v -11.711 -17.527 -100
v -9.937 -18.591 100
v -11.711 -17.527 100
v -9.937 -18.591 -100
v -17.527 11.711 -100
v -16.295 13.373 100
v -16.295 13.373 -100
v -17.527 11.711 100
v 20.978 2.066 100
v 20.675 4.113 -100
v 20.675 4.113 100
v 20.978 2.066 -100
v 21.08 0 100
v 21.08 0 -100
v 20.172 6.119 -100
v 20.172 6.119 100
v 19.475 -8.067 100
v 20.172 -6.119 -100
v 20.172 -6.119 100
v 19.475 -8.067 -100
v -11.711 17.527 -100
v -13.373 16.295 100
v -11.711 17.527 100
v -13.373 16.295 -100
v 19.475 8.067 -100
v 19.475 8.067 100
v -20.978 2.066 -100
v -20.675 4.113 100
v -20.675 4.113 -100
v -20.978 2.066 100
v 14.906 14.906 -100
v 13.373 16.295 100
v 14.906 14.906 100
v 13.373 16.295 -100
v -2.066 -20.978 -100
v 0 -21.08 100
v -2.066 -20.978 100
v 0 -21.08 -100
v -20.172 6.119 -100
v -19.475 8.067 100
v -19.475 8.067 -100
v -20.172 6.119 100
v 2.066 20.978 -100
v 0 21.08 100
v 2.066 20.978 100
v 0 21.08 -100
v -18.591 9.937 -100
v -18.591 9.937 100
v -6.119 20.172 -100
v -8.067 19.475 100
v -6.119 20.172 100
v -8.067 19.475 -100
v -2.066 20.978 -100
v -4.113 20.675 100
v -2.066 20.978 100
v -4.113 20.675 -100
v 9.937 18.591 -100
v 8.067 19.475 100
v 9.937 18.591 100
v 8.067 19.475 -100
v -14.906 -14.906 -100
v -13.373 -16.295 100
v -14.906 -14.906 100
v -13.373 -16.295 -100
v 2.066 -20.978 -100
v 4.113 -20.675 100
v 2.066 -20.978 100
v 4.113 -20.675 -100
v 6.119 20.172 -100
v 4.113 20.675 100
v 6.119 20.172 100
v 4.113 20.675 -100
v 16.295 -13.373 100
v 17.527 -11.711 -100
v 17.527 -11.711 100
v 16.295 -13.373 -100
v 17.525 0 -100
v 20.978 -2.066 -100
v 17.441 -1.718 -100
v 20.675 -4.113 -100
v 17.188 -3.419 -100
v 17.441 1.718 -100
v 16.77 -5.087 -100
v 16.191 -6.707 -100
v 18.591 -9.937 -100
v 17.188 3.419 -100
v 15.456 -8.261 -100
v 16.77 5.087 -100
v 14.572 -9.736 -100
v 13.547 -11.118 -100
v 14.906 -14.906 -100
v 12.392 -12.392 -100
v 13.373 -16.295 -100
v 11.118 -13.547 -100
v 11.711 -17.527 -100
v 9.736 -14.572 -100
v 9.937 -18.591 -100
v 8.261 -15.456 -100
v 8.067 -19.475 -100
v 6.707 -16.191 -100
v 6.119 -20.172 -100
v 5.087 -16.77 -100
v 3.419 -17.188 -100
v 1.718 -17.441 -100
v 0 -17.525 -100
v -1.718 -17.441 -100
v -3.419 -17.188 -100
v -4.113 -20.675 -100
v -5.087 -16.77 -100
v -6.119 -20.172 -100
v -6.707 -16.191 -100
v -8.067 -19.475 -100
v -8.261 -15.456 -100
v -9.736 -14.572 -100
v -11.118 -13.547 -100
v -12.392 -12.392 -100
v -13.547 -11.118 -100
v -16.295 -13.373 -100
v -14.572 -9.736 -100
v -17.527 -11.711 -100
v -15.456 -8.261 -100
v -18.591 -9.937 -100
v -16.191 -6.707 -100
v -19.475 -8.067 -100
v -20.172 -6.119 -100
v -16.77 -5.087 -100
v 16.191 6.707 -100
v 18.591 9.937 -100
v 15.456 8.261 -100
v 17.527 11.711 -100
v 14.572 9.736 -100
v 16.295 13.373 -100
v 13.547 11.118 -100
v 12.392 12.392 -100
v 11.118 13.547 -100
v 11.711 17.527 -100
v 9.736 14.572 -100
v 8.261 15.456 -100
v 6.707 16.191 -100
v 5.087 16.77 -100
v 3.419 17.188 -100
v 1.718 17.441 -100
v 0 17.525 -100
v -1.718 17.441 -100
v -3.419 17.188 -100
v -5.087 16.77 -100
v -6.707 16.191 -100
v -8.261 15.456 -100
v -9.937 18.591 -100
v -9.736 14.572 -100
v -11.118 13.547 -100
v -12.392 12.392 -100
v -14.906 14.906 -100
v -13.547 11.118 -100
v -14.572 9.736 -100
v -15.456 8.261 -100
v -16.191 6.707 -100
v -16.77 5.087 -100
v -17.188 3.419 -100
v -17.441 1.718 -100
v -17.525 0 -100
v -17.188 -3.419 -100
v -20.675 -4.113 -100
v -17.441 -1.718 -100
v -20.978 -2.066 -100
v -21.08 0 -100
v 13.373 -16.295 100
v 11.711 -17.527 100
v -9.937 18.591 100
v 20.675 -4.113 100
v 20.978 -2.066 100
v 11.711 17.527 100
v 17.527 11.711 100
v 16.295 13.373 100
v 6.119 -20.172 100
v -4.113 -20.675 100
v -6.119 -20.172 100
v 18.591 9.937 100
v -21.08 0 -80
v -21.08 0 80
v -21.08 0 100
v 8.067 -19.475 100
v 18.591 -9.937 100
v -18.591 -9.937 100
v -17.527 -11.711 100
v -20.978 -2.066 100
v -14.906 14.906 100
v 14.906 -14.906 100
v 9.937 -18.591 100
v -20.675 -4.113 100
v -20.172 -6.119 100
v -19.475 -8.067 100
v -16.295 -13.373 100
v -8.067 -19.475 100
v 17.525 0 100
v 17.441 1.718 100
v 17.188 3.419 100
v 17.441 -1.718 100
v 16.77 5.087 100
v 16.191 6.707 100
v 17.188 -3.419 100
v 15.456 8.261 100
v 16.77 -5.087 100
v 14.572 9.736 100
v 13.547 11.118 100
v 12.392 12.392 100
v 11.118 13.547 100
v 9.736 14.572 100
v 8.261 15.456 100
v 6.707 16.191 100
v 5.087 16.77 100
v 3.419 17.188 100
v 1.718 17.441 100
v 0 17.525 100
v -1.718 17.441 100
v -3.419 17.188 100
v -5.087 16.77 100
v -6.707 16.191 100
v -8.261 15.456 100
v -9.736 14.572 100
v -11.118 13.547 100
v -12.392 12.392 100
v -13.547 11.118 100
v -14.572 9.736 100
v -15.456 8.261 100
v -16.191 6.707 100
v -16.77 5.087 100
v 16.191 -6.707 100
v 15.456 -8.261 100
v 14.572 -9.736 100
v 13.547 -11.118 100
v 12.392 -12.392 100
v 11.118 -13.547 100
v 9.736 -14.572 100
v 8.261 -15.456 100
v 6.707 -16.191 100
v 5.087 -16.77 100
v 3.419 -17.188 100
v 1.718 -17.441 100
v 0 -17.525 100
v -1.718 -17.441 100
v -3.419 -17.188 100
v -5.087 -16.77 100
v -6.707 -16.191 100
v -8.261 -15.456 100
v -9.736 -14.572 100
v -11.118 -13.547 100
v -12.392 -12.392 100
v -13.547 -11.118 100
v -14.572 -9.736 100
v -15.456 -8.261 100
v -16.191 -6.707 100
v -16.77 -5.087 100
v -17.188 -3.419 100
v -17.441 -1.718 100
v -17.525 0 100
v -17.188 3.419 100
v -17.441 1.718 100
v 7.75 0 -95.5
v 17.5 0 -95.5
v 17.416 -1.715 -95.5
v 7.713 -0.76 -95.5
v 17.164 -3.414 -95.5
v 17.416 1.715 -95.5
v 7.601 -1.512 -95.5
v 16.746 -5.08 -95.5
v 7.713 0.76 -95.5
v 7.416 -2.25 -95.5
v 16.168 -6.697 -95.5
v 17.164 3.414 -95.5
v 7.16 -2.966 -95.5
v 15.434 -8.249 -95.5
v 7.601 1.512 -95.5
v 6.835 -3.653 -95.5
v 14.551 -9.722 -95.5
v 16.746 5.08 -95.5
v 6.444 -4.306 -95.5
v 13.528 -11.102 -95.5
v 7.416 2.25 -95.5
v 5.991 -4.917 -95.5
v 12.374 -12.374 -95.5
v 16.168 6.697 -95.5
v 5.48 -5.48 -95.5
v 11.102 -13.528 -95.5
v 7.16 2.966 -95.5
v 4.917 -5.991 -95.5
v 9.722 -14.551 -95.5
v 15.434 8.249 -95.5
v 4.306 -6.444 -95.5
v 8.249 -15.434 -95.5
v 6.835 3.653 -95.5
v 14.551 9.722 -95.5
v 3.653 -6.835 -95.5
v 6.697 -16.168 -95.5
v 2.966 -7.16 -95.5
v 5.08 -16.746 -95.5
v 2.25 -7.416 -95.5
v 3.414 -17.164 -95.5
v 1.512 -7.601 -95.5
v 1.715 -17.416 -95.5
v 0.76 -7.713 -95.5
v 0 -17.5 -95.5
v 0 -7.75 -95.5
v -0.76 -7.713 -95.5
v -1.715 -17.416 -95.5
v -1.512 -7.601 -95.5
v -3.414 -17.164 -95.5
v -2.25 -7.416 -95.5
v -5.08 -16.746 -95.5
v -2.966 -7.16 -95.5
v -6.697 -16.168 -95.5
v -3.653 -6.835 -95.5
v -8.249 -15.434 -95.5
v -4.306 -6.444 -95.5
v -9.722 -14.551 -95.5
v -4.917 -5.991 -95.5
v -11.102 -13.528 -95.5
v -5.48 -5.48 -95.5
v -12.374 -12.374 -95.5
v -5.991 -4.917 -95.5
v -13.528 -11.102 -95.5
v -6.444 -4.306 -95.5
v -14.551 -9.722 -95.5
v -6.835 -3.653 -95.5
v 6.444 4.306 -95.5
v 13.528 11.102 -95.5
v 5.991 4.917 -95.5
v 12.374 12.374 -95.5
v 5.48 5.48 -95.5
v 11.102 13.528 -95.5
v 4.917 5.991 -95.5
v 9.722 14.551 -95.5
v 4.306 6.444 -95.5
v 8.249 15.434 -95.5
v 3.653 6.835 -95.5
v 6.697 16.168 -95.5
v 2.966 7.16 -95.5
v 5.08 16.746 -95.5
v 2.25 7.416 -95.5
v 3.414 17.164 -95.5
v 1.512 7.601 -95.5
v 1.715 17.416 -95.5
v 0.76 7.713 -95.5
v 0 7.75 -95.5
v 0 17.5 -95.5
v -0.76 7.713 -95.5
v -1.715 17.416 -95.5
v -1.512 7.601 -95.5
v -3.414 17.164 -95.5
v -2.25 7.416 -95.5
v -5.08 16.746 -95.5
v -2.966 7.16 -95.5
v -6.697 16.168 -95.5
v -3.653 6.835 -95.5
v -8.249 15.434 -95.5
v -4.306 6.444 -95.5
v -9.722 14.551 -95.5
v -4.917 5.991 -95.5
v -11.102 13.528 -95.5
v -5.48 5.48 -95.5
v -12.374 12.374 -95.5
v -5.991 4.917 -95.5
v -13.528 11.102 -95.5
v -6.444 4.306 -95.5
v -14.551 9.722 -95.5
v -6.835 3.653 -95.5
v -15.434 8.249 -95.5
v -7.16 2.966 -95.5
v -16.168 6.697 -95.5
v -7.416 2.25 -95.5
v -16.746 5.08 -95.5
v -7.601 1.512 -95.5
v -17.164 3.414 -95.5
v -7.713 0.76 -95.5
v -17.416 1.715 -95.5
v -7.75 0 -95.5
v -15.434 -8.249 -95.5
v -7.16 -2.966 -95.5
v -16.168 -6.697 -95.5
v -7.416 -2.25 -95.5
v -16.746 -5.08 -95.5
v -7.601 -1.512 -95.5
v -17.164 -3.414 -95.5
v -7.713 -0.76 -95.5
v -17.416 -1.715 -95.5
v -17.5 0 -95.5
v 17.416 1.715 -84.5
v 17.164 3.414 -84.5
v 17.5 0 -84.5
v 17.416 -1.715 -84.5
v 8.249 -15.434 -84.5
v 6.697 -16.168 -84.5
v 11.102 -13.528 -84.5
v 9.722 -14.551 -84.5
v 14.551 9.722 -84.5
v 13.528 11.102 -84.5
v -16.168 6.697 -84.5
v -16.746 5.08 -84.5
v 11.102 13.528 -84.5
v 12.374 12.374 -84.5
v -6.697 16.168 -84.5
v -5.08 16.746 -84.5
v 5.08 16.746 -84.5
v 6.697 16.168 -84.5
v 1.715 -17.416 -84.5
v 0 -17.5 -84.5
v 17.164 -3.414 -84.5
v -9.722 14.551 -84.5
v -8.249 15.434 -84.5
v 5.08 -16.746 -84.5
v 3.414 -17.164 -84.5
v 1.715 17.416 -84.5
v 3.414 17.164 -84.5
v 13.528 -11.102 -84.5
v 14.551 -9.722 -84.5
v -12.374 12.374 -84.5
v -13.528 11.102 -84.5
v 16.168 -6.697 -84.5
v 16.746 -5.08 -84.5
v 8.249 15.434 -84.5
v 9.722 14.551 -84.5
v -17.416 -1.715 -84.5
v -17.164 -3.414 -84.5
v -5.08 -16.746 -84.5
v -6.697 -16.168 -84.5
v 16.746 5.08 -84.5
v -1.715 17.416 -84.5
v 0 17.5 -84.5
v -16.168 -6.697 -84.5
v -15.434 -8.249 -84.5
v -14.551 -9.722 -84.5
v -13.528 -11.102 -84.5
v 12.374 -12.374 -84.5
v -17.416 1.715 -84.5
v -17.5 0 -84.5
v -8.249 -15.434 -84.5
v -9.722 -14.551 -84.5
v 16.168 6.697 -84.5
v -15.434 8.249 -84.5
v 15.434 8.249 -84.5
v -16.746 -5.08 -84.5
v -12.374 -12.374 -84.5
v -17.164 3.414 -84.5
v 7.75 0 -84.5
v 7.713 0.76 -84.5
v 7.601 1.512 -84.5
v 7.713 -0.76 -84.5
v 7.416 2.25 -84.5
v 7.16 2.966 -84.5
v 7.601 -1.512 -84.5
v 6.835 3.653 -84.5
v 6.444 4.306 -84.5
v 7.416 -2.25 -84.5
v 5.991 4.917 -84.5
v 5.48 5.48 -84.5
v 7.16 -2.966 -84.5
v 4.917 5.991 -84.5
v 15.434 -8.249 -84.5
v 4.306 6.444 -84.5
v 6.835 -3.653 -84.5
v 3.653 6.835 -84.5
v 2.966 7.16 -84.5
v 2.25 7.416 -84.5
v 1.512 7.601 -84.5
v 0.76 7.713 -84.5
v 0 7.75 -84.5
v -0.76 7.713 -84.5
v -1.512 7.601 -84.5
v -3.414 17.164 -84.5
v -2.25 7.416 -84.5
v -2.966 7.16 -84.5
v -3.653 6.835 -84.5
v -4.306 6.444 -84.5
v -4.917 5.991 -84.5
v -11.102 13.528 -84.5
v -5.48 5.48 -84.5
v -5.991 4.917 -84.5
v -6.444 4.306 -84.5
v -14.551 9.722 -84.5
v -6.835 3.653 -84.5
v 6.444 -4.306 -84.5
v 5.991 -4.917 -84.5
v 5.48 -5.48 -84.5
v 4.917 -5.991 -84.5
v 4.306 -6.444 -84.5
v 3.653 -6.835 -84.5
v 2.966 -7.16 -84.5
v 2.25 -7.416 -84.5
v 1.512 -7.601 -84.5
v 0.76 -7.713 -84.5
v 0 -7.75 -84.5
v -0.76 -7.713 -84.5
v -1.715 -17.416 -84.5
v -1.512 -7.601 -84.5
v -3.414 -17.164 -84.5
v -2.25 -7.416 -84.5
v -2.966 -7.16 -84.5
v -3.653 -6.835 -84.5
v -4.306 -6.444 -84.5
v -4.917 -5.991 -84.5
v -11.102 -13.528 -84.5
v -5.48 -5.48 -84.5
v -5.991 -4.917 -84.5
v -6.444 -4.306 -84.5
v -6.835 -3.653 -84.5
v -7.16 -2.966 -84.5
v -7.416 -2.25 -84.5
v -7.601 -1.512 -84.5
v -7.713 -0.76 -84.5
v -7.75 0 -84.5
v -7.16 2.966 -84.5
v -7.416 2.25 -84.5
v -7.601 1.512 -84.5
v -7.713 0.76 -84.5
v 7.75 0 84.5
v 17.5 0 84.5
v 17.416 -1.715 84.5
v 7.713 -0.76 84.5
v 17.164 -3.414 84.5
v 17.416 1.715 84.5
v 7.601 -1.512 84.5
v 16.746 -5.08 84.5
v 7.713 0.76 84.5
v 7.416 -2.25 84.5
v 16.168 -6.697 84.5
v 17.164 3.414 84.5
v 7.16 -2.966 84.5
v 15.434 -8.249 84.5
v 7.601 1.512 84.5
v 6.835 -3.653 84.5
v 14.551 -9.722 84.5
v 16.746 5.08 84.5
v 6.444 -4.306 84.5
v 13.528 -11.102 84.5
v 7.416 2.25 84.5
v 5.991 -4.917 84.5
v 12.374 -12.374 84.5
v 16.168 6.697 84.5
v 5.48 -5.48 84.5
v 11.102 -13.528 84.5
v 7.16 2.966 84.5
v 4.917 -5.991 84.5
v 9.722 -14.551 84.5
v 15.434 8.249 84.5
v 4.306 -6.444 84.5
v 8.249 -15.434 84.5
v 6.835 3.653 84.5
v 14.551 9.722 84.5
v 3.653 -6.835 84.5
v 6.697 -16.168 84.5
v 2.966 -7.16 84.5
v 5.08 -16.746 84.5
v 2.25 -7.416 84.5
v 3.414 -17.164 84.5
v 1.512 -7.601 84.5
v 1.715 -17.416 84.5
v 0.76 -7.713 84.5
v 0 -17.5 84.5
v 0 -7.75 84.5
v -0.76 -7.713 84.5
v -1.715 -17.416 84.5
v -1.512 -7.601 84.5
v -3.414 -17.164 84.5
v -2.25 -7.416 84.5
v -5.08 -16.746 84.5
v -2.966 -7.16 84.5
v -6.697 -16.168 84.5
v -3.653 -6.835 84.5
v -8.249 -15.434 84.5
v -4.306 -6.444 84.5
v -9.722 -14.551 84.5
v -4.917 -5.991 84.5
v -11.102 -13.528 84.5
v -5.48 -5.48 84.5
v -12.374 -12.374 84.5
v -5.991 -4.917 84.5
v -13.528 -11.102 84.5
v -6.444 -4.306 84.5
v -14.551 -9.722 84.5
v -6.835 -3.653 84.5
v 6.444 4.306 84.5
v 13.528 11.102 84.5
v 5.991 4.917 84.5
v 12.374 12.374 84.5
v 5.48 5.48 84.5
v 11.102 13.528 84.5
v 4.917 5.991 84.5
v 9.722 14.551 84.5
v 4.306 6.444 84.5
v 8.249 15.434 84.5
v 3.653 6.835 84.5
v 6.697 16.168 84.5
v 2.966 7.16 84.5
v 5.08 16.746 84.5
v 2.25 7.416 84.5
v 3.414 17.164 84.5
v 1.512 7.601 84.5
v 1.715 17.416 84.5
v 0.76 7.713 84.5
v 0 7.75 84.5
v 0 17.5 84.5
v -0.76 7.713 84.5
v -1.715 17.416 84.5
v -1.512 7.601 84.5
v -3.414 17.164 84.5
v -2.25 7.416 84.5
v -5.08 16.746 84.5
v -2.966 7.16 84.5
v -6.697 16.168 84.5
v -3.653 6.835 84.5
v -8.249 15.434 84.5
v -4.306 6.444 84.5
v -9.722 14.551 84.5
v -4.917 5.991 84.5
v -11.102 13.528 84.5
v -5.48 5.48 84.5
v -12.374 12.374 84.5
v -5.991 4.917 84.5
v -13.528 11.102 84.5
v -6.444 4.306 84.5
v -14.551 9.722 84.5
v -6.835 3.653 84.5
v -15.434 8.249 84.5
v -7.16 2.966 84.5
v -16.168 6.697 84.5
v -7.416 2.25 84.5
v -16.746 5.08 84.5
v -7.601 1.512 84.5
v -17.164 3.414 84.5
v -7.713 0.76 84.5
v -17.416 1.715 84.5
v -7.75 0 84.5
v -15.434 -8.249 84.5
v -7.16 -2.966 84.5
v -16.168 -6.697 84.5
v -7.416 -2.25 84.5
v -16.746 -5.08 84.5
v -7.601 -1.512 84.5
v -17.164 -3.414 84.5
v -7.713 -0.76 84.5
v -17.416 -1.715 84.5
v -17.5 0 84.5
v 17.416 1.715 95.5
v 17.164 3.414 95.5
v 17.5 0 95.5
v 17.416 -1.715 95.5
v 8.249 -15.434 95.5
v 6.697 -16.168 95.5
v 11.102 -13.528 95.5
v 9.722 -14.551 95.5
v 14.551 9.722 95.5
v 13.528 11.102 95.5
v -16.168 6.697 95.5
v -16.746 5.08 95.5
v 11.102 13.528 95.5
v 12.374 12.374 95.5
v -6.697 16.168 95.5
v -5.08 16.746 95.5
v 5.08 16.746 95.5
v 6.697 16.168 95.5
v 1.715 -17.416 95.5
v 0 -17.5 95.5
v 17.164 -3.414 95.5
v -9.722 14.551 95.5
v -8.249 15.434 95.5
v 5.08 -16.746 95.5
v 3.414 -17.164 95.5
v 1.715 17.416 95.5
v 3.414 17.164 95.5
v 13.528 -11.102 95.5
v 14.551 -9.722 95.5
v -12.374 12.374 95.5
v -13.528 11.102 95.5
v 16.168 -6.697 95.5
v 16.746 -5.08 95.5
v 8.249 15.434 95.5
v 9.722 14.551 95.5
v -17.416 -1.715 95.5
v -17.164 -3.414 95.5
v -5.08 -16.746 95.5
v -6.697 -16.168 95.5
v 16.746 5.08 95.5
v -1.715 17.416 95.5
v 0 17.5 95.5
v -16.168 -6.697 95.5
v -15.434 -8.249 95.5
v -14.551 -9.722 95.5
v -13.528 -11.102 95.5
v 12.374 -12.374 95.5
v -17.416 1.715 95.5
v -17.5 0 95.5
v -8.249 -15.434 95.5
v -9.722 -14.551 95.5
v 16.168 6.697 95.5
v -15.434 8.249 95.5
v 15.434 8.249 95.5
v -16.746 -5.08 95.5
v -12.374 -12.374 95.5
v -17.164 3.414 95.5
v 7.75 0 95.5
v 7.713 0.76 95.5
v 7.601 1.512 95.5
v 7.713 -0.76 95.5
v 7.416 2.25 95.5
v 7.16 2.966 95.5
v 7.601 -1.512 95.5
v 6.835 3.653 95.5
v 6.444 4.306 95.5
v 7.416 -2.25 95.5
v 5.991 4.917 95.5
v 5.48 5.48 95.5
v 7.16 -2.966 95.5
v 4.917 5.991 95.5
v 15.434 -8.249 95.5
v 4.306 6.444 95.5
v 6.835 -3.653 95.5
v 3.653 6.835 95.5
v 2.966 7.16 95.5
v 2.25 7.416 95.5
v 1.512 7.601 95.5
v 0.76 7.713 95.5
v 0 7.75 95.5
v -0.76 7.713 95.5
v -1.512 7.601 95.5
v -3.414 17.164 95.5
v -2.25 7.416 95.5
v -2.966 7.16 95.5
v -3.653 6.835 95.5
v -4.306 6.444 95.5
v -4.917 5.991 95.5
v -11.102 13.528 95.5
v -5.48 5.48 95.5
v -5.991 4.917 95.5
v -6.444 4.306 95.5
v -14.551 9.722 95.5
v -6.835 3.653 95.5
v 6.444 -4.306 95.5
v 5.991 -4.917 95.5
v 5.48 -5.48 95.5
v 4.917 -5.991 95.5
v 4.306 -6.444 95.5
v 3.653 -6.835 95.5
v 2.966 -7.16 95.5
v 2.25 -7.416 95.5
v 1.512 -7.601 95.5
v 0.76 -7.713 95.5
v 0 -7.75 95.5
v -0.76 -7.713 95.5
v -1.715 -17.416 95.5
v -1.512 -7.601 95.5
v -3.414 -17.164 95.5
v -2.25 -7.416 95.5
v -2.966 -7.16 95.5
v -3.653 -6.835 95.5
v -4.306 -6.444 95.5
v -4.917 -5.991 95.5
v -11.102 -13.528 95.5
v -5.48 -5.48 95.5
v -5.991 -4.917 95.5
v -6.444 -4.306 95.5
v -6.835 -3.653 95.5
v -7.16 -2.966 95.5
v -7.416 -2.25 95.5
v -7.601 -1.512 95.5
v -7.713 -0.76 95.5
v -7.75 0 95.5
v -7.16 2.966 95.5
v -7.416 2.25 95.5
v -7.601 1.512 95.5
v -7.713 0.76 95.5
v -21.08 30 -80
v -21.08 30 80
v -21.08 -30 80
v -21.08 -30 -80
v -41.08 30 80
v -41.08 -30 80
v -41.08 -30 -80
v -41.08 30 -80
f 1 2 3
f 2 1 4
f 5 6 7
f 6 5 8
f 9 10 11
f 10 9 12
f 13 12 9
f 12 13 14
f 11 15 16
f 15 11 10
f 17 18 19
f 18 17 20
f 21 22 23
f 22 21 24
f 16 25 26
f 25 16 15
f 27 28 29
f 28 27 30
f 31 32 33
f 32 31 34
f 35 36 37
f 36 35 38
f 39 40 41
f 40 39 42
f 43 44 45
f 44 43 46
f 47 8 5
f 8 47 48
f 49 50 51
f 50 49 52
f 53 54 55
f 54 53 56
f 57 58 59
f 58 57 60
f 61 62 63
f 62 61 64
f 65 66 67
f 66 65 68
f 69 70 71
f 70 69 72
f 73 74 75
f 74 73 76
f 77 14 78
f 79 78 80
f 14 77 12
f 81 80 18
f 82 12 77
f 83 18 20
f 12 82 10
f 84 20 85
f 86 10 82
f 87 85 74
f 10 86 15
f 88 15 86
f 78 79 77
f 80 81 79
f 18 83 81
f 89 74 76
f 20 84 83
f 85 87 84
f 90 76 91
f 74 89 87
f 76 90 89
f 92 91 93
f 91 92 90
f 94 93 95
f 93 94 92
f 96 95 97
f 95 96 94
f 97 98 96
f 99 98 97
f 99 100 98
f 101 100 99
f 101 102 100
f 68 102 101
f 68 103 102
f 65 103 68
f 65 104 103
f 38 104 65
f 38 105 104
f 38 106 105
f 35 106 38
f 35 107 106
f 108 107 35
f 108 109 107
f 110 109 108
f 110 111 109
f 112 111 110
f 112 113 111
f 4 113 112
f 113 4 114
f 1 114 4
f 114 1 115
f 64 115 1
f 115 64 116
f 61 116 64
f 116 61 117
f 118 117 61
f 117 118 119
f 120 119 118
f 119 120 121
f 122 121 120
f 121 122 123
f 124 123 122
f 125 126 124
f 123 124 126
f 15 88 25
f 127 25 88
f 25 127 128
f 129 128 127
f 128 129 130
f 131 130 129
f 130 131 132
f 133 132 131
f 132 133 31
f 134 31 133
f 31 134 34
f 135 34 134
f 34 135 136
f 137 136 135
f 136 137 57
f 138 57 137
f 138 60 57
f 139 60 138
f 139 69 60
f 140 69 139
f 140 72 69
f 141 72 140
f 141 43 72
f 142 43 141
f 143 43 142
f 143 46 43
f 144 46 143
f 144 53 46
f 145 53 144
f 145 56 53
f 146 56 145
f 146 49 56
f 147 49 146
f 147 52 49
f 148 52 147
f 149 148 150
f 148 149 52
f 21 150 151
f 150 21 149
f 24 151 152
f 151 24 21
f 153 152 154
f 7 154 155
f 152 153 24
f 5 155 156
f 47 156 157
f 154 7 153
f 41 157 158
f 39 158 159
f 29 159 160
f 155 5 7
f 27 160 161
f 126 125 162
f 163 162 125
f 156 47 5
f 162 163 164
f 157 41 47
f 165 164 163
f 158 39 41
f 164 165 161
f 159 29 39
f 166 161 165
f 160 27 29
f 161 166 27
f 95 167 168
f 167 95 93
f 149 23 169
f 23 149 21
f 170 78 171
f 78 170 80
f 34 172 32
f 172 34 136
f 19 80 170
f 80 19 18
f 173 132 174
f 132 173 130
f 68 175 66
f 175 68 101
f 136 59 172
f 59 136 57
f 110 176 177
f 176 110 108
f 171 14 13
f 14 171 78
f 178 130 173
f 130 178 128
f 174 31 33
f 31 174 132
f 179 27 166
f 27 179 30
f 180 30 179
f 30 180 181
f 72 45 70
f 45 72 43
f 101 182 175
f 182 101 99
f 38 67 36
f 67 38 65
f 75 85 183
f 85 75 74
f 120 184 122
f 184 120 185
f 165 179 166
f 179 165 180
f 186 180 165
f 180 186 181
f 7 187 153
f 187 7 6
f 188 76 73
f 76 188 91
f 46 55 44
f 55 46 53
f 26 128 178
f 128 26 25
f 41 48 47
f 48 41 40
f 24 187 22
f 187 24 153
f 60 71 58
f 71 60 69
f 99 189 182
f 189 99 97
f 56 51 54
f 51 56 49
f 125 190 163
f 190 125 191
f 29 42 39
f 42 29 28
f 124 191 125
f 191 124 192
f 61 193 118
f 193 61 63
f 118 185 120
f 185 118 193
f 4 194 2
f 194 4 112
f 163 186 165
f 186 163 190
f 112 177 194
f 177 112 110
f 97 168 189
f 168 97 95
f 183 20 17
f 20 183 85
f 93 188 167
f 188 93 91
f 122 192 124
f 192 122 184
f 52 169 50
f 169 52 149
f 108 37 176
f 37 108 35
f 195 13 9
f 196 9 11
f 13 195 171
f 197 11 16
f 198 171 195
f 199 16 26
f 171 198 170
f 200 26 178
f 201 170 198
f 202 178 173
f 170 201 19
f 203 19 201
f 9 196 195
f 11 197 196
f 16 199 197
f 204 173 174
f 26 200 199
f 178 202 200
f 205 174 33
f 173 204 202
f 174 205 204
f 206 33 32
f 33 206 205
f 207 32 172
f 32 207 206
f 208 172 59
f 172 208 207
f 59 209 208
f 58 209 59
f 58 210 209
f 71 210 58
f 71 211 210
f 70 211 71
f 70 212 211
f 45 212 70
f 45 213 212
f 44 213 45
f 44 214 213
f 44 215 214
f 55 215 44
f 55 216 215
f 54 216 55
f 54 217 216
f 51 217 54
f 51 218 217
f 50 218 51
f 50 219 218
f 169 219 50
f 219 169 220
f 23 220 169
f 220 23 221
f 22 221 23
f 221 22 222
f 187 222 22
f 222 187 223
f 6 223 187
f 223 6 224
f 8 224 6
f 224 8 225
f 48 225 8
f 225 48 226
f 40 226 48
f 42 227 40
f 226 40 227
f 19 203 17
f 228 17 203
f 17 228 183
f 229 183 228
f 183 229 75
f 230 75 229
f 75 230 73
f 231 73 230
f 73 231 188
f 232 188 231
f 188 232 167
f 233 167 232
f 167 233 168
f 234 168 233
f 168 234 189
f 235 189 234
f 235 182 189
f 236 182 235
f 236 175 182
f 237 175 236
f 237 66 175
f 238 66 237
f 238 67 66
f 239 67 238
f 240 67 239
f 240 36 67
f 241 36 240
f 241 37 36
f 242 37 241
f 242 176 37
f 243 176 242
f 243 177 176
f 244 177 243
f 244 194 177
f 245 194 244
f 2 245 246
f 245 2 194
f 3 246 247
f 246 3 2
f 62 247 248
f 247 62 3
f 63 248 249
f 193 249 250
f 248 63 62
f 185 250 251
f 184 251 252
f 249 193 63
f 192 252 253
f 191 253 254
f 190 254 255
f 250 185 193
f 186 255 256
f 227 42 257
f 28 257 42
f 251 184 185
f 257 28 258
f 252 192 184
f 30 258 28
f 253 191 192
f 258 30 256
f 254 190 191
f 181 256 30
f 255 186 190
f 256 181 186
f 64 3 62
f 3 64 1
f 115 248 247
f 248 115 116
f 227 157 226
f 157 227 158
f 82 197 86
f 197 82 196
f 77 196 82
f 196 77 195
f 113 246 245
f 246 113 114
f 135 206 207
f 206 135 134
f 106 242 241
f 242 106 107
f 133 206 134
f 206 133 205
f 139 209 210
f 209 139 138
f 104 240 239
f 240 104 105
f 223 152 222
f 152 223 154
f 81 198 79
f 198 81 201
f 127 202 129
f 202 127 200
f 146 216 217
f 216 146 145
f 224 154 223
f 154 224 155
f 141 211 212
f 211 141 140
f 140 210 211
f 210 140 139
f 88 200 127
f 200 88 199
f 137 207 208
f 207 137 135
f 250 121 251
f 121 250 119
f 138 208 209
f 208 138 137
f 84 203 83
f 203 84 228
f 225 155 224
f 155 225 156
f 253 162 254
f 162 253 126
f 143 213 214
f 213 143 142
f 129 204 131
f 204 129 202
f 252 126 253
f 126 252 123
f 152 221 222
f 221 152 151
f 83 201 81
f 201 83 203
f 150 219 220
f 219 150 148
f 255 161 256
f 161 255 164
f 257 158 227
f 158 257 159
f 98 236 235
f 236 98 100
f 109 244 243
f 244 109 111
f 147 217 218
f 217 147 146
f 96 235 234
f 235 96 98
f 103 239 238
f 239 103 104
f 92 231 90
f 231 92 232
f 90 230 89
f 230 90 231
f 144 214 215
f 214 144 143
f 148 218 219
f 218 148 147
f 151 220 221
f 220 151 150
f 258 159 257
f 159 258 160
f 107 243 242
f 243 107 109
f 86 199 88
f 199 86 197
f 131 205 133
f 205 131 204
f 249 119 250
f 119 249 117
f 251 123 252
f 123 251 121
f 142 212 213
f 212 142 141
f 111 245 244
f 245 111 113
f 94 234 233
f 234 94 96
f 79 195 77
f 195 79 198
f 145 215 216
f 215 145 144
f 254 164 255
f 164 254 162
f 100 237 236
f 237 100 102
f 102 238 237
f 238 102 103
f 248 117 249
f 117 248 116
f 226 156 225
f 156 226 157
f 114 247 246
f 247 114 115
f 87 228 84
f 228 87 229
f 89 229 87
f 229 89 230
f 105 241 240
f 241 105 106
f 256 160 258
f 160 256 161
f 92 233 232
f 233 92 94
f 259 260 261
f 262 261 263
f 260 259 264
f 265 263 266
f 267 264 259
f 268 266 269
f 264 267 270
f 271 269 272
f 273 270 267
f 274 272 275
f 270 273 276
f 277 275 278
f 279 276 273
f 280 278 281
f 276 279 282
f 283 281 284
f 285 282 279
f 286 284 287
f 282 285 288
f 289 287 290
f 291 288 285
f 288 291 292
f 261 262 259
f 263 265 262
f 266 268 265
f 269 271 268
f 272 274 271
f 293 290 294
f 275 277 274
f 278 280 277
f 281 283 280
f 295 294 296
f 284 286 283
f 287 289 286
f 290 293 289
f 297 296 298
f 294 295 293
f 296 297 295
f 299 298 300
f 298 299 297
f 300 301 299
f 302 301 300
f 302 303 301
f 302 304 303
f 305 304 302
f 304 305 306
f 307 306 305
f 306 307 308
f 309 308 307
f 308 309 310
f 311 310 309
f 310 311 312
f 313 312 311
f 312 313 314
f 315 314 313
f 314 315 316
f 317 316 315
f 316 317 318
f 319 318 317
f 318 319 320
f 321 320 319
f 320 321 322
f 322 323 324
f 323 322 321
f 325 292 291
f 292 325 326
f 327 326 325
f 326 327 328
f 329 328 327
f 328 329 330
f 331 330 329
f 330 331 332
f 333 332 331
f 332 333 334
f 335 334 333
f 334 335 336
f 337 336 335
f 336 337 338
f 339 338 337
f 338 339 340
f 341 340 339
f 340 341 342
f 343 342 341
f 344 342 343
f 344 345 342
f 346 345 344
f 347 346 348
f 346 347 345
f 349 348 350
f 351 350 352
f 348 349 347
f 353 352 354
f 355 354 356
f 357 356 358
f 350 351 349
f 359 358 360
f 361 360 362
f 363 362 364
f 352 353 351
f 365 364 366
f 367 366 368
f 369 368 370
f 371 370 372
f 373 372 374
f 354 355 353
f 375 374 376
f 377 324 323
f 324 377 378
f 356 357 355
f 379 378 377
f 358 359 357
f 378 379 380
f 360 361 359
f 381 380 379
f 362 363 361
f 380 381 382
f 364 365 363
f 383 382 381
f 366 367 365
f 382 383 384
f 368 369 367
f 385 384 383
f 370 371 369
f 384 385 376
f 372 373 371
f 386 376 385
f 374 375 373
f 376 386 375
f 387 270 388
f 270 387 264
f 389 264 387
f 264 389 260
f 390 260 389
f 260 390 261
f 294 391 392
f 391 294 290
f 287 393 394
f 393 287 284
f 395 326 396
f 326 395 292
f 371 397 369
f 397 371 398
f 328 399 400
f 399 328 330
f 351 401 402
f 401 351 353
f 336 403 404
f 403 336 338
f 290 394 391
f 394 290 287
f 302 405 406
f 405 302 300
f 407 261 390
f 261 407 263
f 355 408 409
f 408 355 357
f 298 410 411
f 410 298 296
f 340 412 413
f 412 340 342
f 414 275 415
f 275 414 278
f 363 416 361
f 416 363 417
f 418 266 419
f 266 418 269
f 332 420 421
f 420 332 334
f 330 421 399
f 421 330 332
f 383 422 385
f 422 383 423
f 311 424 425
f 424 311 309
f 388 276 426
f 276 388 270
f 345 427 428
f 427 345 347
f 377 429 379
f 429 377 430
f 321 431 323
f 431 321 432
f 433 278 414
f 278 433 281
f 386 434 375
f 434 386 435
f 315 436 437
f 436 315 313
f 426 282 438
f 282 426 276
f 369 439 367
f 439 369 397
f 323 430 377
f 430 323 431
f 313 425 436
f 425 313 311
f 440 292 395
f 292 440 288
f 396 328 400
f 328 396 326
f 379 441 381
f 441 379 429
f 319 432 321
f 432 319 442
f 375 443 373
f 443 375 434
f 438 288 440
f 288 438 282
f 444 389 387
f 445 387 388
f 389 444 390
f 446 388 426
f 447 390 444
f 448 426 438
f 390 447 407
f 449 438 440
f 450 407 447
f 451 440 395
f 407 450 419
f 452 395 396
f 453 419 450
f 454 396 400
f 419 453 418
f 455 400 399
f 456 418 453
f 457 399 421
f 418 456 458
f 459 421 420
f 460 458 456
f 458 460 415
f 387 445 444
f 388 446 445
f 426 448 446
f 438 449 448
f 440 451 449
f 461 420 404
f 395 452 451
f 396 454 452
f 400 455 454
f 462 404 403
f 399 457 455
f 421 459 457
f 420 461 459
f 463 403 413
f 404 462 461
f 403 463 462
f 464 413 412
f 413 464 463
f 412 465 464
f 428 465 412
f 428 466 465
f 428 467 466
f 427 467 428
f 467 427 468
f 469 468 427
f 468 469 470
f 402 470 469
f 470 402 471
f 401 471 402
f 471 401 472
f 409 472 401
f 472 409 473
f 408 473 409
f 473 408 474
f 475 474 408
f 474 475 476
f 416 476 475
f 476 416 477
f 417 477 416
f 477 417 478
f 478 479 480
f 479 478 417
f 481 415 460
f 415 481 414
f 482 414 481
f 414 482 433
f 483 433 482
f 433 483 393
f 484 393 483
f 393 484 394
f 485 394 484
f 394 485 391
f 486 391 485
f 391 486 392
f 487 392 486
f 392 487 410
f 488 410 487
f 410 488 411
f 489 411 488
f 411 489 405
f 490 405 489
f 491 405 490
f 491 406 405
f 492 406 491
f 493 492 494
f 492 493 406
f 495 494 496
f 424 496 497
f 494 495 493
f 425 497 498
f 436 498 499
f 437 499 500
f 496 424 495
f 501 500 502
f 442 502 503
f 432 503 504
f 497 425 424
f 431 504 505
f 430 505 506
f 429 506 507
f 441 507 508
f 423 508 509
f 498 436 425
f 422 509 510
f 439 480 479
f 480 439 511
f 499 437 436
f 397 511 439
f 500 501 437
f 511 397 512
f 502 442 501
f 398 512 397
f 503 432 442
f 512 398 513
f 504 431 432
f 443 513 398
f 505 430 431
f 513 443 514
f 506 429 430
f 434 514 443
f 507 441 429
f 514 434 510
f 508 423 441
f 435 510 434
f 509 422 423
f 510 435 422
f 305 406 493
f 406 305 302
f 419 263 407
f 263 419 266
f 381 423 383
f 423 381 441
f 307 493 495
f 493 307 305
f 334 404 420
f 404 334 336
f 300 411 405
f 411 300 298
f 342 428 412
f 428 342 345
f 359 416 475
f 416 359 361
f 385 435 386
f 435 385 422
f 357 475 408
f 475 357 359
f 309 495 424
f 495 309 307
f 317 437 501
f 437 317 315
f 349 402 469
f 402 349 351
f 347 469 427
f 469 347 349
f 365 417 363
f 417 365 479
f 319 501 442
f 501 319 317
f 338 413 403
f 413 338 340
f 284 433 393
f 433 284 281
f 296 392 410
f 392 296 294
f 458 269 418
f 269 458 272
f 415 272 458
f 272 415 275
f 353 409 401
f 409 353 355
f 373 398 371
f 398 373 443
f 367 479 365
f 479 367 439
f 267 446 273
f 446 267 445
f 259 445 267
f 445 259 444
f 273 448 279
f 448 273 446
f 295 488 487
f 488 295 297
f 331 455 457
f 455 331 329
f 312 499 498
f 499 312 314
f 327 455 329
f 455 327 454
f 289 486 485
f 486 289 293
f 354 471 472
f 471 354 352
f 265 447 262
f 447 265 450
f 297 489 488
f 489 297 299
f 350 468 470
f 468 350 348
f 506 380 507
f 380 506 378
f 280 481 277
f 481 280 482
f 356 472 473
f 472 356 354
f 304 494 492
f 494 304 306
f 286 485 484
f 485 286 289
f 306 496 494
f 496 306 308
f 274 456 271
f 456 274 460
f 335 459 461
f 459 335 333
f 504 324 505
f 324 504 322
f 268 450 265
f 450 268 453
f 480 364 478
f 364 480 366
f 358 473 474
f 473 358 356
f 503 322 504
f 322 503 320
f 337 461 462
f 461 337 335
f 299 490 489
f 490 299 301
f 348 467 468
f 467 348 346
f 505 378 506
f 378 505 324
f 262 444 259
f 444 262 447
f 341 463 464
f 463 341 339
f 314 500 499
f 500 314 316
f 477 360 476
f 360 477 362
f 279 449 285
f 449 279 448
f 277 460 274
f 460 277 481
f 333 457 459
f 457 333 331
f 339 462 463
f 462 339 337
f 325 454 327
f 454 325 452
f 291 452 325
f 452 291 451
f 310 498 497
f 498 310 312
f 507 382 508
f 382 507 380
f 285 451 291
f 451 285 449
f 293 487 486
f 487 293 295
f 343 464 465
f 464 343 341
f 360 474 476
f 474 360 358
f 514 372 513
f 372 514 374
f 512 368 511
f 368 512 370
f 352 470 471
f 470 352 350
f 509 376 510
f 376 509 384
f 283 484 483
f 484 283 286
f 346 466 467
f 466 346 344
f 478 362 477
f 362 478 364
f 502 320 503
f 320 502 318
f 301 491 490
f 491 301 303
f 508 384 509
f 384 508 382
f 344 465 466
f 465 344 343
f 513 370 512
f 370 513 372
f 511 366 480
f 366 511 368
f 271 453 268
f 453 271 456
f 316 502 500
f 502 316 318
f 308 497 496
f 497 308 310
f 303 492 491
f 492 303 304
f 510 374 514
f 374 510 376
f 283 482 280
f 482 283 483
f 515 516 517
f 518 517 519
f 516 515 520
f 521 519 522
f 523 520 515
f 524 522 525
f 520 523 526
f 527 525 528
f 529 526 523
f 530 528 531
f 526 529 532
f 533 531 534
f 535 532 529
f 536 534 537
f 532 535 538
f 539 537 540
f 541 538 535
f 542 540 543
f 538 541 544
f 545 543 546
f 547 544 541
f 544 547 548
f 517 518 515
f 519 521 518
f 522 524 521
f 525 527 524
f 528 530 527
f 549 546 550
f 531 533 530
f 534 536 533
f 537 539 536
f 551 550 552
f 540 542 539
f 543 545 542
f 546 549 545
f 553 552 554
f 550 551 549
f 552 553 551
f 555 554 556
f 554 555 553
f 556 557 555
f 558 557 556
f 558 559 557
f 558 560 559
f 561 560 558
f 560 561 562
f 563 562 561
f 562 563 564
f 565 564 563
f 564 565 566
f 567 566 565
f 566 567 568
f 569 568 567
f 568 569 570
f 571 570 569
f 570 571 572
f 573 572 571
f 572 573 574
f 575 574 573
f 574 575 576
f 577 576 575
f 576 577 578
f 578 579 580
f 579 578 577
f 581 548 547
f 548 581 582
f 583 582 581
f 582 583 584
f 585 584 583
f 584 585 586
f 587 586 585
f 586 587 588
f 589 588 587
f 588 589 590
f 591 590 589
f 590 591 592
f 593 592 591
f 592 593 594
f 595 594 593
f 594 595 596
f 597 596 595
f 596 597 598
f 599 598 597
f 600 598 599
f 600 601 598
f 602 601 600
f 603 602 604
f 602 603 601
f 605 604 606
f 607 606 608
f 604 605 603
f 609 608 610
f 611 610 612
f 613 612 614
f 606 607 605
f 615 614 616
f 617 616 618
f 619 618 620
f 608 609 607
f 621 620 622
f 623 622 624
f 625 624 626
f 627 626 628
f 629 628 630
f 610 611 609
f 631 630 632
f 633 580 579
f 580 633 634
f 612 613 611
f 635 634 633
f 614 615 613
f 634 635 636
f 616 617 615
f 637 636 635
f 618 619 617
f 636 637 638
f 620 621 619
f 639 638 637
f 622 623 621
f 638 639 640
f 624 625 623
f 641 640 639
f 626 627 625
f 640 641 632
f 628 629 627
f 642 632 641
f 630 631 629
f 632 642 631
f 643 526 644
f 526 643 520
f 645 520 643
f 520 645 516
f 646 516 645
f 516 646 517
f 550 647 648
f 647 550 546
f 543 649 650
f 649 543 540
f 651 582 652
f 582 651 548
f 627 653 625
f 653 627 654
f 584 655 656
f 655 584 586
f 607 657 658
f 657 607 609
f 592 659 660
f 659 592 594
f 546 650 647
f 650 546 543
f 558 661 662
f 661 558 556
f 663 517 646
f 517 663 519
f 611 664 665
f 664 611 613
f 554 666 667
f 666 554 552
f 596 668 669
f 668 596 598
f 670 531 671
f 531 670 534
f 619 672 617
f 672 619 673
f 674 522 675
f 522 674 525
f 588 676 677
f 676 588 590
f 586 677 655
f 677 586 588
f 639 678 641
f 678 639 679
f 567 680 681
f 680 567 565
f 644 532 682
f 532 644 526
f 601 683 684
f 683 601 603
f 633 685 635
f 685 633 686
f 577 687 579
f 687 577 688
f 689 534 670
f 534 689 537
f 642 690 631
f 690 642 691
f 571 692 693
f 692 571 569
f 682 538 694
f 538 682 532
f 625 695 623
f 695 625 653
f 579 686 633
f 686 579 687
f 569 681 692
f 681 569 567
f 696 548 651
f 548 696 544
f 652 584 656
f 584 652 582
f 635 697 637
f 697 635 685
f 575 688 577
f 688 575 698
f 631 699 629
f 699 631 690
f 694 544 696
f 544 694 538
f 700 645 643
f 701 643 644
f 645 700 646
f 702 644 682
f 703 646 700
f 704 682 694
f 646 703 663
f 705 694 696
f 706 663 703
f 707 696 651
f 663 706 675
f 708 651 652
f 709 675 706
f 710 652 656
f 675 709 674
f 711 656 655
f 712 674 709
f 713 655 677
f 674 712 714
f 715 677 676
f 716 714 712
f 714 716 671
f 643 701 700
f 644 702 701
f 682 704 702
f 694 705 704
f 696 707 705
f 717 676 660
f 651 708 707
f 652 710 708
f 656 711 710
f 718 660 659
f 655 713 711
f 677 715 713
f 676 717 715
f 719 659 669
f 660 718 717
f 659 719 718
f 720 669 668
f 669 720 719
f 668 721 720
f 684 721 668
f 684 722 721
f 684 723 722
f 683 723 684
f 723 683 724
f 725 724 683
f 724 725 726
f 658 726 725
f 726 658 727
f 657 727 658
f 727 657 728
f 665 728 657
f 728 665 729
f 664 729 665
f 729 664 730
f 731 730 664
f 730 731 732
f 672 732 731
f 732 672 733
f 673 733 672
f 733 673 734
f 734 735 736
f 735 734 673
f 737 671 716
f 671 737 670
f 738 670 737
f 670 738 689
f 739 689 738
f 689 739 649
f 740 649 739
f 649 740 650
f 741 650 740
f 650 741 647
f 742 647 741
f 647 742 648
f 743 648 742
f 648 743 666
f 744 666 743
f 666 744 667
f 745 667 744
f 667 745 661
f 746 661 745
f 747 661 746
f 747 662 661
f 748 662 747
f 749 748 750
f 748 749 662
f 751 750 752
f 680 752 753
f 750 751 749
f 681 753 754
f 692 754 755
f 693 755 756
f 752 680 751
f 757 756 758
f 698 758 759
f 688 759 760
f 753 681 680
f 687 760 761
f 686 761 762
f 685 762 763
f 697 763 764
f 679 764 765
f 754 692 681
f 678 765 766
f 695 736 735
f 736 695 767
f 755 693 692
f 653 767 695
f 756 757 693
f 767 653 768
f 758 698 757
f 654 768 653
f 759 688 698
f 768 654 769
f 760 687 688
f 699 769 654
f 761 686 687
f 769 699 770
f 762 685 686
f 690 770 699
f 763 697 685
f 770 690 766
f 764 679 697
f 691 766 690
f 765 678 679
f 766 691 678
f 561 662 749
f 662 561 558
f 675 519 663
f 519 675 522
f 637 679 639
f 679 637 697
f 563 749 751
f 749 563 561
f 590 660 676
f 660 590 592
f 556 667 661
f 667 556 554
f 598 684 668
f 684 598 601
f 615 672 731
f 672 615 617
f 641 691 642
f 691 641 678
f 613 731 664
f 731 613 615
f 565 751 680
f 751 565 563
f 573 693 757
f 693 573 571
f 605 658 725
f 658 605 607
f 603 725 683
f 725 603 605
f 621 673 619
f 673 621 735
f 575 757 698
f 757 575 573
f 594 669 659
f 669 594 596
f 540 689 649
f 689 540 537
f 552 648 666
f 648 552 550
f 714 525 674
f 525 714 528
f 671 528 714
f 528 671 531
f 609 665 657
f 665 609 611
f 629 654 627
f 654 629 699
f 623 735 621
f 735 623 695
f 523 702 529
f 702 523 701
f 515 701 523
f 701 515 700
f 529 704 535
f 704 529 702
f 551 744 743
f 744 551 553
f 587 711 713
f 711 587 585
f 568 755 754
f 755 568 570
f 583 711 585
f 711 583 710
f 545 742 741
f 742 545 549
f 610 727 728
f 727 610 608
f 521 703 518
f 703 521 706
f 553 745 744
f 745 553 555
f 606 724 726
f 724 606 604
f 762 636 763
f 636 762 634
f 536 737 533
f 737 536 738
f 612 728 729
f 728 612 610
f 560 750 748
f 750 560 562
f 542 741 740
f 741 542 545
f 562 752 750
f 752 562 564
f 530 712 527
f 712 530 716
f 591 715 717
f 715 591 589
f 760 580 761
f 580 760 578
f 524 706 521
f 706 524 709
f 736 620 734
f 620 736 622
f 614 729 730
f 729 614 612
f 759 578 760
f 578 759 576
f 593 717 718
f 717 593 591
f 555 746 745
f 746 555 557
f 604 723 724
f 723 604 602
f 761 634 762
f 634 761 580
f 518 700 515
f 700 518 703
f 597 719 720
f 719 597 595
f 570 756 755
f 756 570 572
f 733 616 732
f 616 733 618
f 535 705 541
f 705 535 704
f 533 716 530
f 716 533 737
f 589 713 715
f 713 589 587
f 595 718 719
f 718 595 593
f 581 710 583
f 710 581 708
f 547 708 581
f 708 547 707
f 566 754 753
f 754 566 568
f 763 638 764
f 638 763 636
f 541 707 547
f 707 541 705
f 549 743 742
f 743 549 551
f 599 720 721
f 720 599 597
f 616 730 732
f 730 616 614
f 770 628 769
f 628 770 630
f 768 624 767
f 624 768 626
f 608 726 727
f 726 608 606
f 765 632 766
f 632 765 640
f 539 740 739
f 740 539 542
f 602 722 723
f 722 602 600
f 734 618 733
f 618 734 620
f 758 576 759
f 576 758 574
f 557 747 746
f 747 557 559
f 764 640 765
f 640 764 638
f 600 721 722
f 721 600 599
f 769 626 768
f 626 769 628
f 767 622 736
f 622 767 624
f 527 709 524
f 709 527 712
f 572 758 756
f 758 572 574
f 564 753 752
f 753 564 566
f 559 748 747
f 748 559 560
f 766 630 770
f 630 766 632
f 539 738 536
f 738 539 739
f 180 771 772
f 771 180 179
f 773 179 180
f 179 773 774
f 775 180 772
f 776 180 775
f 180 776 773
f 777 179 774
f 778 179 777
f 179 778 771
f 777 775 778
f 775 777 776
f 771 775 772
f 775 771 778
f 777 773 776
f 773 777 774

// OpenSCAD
// file: parts.scad
include <master_dims.scad>

$fn = 64;

// Surface-to-Surface logic: each part has a local origin
// and defines its "mating" surfaces.

// ---------------------------------------------------------
// TIRE (The Root Anchor)
// ---------------------------------------------------------
module car_tire_13in() {
    color([0.2, 0.2, 0.2])
    rotate_extrude()
    translate([front_tire_od/2 - front_tire_width/4, 0, 0])
    circle(d=front_tire_width/2);

    // RIM (Simplified)
    color("silver")
    rotate_extrude()
    translate([front_rim_dia/2, 0, 0])
    square([20, front_tire_width-20], center=true);
}

// ---------------------------------------------------------
// FRONT HUB (Mates to Tire Center)
// ---------------------------------------------------------
module front_hub_motor() {
    // Body
    color("dimgray")
    rotate([90, 0, 0])
    cylinder(d=180, h=front_hub_dropout - 20, center=true);

    // Axle Protrusions (Mating Surfaces for Fork Dropouts)
    color("black")
    rotate([90, 0, 0])
    cylinder(d=front_axle_dia, h=front_hub_dropout + 40, center=true);

    // Flanges
    for(s=[-1, 1]) translate([0, s*(front_hub_dropout/2 - 10), 0])
    rotate([90, 0, 0])
    color("gray") cylinder(d=200, h=5, center=true);
}

// ---------------------------------------------------------
// RECTANGULAR TUBE (Utility)
// ---------------------------------------------------------
module rect_tube(w, h, l, t=2.5) {
    difference() {
        cube([l, w, h], center=true);
        cube([l+2, w-2*t, h-2*t], center=true);
    }
}

// ---------------------------------------------------------
// PIPE (Utility)
// ---------------------------------------------------------
module pipe(od, id, h) {
    difference() {
        cylinder(d=od, h=h, center=true);
        cylinder(d=id, h=h+2, center=true);
    }
}
// file: master_dims.scad
// master_dims.scad - Central dimensions for Industrial E-Bakfiets

// Standard Units: mm

// 1. FRONT TIRE (The Anchor)
front_tire_od = 548;
front_tire_width = 155;
front_rim_dia = 330;

// 2. FRONT HUB / MOTOR
front_hub_dropout = 175;
front_hub_flange_dia = 180;
front_axle_dia = 14;

// 3. FRONT FORK
fork_inner_spacing = 185;
fork_blade_width = 30;
fork_crown_width = 250;
fork_length = 360;
fork_rake = 45;

// 4. STEERING HEAD
head_angle = 68;
steering_shaft_dia = 15;
bearing_od = 35;
bearing_h = 11;
head_tube_od = 42.16;
head_tube_id = 35.05;
head_tube_length = 200;

// 5. FRAME
bed_width = 810;
bed_length = 1250;
main_spar_size = 40;
ground_clearance = 150;
wheelbase = 1950;

// 6. REAR END
rear_wheel_dia = 410;
rear_dropout_spacing = 135;
bb_height = 285;
bb_offset_x = 450;

// 7. CARGO BOX
box_height = 600;
box_wall_t = 12;

// 8. STABILIZERS
stab_size = 35;
stab_deploy_len = 250;
// main file
include <master_dims.scad>
use <parts.scad>

// The Steering Head houses the shaft and connects to the Frame.
// Origin = Center of Head Tube
module steering_head_assy() {
    // 1. Main Head Tube
    color("firebrick")
    pipe(head_tube_od, head_tube_id, head_tube_length);

    // 2. Bearings (Top and Bottom)
    for(z=[-head_tube_length/2 + 10, head_tube_length/2 - 10])
    translate([0, 0, z])
    color("blue")
    pipe(bearing_od, steering_shaft_dia + 0.5, 11);

    // 3. Frame Connection Gusset (Surface for Frame spars)
    // Centered on the HT
    translate([-head_tube_od/2 - 10, 0, 0])
    color("firebrick")
    cube([20, 60, head_tube_length - 40], center=true);
}

steering_head_assy();
